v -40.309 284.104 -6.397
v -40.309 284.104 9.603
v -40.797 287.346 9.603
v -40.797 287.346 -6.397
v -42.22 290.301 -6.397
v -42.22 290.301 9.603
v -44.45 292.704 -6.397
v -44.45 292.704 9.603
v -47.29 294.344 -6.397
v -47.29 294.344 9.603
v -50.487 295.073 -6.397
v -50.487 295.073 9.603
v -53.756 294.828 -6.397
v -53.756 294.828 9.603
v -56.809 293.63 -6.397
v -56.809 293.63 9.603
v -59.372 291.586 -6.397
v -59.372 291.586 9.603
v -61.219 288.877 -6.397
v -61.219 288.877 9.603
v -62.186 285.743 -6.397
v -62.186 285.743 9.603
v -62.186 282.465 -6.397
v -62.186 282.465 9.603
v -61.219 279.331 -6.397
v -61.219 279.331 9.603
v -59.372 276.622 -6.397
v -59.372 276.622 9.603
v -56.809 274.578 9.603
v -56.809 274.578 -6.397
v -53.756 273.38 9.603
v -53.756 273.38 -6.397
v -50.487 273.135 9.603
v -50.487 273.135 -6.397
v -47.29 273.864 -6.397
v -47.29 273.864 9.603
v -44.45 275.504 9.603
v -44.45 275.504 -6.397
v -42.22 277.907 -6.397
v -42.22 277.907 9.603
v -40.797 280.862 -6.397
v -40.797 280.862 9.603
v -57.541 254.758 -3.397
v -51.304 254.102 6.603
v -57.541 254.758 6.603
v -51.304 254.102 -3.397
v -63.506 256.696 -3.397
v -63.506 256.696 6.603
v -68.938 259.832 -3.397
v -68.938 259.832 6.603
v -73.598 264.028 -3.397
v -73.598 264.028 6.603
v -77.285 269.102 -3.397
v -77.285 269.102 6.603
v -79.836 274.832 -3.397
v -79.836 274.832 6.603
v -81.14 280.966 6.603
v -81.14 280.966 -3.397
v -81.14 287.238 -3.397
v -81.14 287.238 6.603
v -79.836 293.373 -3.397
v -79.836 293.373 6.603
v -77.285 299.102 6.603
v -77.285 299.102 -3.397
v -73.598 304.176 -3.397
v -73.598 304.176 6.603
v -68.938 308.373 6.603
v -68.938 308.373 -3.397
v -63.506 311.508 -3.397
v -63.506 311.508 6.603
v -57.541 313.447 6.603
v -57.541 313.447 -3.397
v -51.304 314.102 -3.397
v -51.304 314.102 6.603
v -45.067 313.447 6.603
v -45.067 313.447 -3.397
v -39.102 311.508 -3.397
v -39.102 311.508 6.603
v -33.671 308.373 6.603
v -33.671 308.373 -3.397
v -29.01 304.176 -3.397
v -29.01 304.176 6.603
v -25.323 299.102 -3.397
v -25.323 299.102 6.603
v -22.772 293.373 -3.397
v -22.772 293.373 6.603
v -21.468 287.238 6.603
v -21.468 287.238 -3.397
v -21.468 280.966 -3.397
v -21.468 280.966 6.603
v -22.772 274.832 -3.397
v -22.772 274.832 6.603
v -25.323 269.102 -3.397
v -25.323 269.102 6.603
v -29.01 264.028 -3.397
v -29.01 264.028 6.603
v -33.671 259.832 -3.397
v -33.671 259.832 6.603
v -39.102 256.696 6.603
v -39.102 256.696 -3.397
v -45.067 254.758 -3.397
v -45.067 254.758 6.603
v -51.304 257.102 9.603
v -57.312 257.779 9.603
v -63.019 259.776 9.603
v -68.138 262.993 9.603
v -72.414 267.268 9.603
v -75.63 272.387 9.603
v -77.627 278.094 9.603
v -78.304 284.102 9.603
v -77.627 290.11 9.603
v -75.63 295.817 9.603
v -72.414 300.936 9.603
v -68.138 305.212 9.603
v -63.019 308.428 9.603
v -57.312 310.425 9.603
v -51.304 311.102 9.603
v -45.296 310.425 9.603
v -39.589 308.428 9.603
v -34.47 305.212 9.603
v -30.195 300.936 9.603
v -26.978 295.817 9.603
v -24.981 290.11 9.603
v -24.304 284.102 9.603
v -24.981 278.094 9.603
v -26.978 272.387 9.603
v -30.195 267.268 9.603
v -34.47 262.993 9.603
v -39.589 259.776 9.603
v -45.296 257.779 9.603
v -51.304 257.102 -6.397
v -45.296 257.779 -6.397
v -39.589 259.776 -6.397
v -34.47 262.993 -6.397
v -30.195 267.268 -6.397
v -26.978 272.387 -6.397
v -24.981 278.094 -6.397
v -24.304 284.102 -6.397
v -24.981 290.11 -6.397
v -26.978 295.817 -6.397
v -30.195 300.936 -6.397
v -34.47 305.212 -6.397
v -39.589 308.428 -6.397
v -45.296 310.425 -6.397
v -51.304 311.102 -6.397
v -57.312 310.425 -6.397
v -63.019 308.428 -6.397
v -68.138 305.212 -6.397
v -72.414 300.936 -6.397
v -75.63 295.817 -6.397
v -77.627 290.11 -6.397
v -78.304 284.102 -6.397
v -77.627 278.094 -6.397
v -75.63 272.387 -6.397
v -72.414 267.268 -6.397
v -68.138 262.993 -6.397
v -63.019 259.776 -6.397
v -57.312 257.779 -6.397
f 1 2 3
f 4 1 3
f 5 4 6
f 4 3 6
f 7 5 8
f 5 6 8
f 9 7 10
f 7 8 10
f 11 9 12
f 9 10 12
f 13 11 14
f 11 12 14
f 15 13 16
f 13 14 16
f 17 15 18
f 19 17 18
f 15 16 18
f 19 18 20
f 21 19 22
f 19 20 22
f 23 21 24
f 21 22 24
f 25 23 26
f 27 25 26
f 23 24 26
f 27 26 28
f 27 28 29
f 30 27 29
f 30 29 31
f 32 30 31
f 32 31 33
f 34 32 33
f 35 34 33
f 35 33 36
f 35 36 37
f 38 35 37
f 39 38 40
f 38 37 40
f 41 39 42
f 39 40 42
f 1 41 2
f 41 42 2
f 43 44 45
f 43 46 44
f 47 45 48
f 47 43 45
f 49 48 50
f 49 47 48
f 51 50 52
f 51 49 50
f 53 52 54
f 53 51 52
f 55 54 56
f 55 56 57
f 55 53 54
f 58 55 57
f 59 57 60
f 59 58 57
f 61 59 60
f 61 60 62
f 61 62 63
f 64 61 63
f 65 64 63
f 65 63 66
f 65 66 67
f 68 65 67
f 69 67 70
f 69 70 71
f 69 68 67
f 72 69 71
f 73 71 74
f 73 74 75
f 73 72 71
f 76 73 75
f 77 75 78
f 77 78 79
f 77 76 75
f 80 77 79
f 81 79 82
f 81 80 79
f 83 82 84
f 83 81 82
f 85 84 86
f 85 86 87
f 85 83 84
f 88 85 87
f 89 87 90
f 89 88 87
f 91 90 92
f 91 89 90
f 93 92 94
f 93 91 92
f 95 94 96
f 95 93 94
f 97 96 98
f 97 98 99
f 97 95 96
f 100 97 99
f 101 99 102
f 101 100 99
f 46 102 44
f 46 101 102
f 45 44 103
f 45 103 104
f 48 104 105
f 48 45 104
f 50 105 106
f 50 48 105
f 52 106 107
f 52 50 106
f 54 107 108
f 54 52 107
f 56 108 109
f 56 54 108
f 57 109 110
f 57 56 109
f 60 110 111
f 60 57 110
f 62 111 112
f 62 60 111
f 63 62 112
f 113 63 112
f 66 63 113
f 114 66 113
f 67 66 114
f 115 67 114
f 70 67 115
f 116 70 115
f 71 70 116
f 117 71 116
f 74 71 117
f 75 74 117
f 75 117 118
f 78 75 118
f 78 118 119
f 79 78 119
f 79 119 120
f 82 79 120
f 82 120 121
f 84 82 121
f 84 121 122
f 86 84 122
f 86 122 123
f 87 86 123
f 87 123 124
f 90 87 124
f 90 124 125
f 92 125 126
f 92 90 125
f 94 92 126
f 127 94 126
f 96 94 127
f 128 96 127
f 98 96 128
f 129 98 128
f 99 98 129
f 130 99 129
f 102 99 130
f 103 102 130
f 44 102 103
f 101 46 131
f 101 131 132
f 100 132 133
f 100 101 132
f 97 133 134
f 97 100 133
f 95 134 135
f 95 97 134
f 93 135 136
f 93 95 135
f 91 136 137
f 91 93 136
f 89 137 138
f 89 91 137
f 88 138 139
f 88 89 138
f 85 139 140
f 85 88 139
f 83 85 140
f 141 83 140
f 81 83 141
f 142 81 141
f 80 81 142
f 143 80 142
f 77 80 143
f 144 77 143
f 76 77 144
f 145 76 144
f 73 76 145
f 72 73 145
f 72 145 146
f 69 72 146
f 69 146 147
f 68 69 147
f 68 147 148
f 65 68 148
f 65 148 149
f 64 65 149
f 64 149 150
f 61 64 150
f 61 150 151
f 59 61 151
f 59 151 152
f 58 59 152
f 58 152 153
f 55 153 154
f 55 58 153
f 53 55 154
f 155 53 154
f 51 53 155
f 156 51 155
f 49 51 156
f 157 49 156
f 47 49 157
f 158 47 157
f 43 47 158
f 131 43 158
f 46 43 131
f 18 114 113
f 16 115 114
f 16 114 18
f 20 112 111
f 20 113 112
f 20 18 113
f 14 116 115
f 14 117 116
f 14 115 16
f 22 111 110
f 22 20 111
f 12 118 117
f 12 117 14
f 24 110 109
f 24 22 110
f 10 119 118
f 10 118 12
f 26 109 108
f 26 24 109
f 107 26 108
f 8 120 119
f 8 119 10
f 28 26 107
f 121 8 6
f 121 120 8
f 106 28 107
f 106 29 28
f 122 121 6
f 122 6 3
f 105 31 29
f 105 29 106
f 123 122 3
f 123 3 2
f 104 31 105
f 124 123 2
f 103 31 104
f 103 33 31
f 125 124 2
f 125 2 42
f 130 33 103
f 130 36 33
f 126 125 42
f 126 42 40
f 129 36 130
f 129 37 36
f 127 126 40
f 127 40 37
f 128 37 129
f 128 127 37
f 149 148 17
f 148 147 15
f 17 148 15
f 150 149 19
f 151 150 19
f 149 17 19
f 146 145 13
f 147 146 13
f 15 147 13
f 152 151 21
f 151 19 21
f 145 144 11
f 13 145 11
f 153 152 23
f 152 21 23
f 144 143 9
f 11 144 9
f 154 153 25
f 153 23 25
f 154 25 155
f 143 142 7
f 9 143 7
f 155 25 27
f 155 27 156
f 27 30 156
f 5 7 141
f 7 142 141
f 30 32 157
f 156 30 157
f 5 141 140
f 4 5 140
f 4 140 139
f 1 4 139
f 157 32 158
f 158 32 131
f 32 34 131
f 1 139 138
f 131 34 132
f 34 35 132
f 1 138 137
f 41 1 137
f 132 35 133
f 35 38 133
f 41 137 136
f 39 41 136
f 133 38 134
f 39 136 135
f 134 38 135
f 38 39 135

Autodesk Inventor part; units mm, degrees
ref_plane "YZ Plane" through (0, 0, 0) normal (1, 0, 0) x (0, 1, 0)
ref_plane "XZ Plane" through (0, 0, 0) normal (0, 1, 0) x (-1, 0, 0)
ref_plane "XY Plane" through (0, 0, 0) normal (0, 0, 1) x (1, 0, 0)
ref_plane "Work Plane1" through (-52.4749, 258.6532, -6.397) normal (0, 0, 1) x (0, -1, 0)
sketch "Sketch1" plane through (-52.4749, 258.6532, -6.397) normal (0, 0, 1) x (0, -1, 0)
  line L0 (0.0003, 0.0039) -> (-20.2411, 10.8651) projected
  arc A0 (-20.2411, 10.8651) -> (-35.6461, -2.9695) centre (-25.4455, 1.1661) ccw projected
  line L1 (-35.6461, -2.9695) -> (42.4229, -195.5278) projected
  line L2 (42.4229, -195.5278) -> (42.4229, -219.8278) projected
  line L3 (42.4229, -219.8278) -> (81.4481, -219.8278) projected
  line L4 (81.4481, -219.8278) -> (168.2058, -219.8263) projected
  line L5 (168.2058, -219.8263) -> (207.231, -219.8261) projected
  line L6 (207.231, -219.8261) -> (207.2309, -195.5273) projected
  ellipse E0 centre (186.2274, -195.5271) end of major axis (212.7883, -195.527) minor radius 0.0003 (207.231, -195.5268) -> (207.2309, -195.5273) ccw projected
  line L7 (207.231, -195.5268) -> (285.3, -2.9593) projected
  arc A1 (285.3, -2.9593) -> (269.9065, 10.8669) centre (275.106, 1.1734) ccw projected
  line L8 (269.9065, 10.8669) -> (249.6555, 0.0046) projected
  arc A2 (246.3474, -0.8266) -> (249.6555, 0.0046) centre (246.3474, 6.172) ccw projected
  line L9 (246.3474, -0.8266) -> (234.7987, -0.8277) projected
  arc A3 (234.7987, -0.8277) -> (224.1037, -11.8268) centre (235.1053, -11.8251) ccw projected
  line L10 (224.1037, -11.8268) -> (224.1037, -23.8268) projected
  line L11 (224.1037, -23.8268) -> (25.5516, -23.8268) projected
  line L12 (25.5516, -23.8268) -> (25.5516, -11.8268) projected
  arc A4 (25.5516, -11.8268) -> (14.3466, -0.8277) centre (14.5506, -11.8268) ccw projected
  line L13 (14.3466, -0.8277) -> (3.3091, -0.8277) projected
  arc A5 (0.0003, 0.0039) -> (3.3091, -0.8277) centre (3.3091, 6.1703) ccw projected
  circle A6 centre (275.1036, 1.1723) radius 4.5971 projected
  circle A7 centre (235.1053, -11.8251) radius 4.1019 projected
  circle A8 centre (14.5506, -11.8268) radius 4.101 projected
  circle A9 centre (61.9506, -207.5286) radius 4.1026 projected
  circle A10 centre (187.7028, -207.5216) radius 4.1055 projected
  circle A11 centre (-25.4489, 1.1708) radius 4.0986 projected
  circle A12 centre (-25.4489, 1.1708) radius 30
  point P0 (258.6534, 52.4739)
  dimension "d0" = 60
extrude "Extrusion1" add sketch "Sketch1" along normal blind 16 contours A5 L13 A12 L1 A0 L0 | L0 A0 L1 A12 L13 A5 | A11
chamfer "Chamfer1" distance 3 angle 45 2 edges at (-51.3043, 314.1021, -6.3967) (-51.3043, 314.102, 9.6033)
sketch "Sketch2" plane through (-51.3042, 284.102, 9.6032) normal (0, 0, 1) x (1, 0, 0)
  circle A0 centre (0, 0) radius 27 projected
  circle A1 centre (-0.0044, 0.002) radius 4.0977 projected
  circle A2 centre (-0.0044, 0.002) radius 11
  point P0 (51.3042, -284.102)
  dimension "d8" = 22
extrude "Extrusion2" cut sketch "Sketch2" against normal through all contours A1 | A2
properties part number "Wheel"
